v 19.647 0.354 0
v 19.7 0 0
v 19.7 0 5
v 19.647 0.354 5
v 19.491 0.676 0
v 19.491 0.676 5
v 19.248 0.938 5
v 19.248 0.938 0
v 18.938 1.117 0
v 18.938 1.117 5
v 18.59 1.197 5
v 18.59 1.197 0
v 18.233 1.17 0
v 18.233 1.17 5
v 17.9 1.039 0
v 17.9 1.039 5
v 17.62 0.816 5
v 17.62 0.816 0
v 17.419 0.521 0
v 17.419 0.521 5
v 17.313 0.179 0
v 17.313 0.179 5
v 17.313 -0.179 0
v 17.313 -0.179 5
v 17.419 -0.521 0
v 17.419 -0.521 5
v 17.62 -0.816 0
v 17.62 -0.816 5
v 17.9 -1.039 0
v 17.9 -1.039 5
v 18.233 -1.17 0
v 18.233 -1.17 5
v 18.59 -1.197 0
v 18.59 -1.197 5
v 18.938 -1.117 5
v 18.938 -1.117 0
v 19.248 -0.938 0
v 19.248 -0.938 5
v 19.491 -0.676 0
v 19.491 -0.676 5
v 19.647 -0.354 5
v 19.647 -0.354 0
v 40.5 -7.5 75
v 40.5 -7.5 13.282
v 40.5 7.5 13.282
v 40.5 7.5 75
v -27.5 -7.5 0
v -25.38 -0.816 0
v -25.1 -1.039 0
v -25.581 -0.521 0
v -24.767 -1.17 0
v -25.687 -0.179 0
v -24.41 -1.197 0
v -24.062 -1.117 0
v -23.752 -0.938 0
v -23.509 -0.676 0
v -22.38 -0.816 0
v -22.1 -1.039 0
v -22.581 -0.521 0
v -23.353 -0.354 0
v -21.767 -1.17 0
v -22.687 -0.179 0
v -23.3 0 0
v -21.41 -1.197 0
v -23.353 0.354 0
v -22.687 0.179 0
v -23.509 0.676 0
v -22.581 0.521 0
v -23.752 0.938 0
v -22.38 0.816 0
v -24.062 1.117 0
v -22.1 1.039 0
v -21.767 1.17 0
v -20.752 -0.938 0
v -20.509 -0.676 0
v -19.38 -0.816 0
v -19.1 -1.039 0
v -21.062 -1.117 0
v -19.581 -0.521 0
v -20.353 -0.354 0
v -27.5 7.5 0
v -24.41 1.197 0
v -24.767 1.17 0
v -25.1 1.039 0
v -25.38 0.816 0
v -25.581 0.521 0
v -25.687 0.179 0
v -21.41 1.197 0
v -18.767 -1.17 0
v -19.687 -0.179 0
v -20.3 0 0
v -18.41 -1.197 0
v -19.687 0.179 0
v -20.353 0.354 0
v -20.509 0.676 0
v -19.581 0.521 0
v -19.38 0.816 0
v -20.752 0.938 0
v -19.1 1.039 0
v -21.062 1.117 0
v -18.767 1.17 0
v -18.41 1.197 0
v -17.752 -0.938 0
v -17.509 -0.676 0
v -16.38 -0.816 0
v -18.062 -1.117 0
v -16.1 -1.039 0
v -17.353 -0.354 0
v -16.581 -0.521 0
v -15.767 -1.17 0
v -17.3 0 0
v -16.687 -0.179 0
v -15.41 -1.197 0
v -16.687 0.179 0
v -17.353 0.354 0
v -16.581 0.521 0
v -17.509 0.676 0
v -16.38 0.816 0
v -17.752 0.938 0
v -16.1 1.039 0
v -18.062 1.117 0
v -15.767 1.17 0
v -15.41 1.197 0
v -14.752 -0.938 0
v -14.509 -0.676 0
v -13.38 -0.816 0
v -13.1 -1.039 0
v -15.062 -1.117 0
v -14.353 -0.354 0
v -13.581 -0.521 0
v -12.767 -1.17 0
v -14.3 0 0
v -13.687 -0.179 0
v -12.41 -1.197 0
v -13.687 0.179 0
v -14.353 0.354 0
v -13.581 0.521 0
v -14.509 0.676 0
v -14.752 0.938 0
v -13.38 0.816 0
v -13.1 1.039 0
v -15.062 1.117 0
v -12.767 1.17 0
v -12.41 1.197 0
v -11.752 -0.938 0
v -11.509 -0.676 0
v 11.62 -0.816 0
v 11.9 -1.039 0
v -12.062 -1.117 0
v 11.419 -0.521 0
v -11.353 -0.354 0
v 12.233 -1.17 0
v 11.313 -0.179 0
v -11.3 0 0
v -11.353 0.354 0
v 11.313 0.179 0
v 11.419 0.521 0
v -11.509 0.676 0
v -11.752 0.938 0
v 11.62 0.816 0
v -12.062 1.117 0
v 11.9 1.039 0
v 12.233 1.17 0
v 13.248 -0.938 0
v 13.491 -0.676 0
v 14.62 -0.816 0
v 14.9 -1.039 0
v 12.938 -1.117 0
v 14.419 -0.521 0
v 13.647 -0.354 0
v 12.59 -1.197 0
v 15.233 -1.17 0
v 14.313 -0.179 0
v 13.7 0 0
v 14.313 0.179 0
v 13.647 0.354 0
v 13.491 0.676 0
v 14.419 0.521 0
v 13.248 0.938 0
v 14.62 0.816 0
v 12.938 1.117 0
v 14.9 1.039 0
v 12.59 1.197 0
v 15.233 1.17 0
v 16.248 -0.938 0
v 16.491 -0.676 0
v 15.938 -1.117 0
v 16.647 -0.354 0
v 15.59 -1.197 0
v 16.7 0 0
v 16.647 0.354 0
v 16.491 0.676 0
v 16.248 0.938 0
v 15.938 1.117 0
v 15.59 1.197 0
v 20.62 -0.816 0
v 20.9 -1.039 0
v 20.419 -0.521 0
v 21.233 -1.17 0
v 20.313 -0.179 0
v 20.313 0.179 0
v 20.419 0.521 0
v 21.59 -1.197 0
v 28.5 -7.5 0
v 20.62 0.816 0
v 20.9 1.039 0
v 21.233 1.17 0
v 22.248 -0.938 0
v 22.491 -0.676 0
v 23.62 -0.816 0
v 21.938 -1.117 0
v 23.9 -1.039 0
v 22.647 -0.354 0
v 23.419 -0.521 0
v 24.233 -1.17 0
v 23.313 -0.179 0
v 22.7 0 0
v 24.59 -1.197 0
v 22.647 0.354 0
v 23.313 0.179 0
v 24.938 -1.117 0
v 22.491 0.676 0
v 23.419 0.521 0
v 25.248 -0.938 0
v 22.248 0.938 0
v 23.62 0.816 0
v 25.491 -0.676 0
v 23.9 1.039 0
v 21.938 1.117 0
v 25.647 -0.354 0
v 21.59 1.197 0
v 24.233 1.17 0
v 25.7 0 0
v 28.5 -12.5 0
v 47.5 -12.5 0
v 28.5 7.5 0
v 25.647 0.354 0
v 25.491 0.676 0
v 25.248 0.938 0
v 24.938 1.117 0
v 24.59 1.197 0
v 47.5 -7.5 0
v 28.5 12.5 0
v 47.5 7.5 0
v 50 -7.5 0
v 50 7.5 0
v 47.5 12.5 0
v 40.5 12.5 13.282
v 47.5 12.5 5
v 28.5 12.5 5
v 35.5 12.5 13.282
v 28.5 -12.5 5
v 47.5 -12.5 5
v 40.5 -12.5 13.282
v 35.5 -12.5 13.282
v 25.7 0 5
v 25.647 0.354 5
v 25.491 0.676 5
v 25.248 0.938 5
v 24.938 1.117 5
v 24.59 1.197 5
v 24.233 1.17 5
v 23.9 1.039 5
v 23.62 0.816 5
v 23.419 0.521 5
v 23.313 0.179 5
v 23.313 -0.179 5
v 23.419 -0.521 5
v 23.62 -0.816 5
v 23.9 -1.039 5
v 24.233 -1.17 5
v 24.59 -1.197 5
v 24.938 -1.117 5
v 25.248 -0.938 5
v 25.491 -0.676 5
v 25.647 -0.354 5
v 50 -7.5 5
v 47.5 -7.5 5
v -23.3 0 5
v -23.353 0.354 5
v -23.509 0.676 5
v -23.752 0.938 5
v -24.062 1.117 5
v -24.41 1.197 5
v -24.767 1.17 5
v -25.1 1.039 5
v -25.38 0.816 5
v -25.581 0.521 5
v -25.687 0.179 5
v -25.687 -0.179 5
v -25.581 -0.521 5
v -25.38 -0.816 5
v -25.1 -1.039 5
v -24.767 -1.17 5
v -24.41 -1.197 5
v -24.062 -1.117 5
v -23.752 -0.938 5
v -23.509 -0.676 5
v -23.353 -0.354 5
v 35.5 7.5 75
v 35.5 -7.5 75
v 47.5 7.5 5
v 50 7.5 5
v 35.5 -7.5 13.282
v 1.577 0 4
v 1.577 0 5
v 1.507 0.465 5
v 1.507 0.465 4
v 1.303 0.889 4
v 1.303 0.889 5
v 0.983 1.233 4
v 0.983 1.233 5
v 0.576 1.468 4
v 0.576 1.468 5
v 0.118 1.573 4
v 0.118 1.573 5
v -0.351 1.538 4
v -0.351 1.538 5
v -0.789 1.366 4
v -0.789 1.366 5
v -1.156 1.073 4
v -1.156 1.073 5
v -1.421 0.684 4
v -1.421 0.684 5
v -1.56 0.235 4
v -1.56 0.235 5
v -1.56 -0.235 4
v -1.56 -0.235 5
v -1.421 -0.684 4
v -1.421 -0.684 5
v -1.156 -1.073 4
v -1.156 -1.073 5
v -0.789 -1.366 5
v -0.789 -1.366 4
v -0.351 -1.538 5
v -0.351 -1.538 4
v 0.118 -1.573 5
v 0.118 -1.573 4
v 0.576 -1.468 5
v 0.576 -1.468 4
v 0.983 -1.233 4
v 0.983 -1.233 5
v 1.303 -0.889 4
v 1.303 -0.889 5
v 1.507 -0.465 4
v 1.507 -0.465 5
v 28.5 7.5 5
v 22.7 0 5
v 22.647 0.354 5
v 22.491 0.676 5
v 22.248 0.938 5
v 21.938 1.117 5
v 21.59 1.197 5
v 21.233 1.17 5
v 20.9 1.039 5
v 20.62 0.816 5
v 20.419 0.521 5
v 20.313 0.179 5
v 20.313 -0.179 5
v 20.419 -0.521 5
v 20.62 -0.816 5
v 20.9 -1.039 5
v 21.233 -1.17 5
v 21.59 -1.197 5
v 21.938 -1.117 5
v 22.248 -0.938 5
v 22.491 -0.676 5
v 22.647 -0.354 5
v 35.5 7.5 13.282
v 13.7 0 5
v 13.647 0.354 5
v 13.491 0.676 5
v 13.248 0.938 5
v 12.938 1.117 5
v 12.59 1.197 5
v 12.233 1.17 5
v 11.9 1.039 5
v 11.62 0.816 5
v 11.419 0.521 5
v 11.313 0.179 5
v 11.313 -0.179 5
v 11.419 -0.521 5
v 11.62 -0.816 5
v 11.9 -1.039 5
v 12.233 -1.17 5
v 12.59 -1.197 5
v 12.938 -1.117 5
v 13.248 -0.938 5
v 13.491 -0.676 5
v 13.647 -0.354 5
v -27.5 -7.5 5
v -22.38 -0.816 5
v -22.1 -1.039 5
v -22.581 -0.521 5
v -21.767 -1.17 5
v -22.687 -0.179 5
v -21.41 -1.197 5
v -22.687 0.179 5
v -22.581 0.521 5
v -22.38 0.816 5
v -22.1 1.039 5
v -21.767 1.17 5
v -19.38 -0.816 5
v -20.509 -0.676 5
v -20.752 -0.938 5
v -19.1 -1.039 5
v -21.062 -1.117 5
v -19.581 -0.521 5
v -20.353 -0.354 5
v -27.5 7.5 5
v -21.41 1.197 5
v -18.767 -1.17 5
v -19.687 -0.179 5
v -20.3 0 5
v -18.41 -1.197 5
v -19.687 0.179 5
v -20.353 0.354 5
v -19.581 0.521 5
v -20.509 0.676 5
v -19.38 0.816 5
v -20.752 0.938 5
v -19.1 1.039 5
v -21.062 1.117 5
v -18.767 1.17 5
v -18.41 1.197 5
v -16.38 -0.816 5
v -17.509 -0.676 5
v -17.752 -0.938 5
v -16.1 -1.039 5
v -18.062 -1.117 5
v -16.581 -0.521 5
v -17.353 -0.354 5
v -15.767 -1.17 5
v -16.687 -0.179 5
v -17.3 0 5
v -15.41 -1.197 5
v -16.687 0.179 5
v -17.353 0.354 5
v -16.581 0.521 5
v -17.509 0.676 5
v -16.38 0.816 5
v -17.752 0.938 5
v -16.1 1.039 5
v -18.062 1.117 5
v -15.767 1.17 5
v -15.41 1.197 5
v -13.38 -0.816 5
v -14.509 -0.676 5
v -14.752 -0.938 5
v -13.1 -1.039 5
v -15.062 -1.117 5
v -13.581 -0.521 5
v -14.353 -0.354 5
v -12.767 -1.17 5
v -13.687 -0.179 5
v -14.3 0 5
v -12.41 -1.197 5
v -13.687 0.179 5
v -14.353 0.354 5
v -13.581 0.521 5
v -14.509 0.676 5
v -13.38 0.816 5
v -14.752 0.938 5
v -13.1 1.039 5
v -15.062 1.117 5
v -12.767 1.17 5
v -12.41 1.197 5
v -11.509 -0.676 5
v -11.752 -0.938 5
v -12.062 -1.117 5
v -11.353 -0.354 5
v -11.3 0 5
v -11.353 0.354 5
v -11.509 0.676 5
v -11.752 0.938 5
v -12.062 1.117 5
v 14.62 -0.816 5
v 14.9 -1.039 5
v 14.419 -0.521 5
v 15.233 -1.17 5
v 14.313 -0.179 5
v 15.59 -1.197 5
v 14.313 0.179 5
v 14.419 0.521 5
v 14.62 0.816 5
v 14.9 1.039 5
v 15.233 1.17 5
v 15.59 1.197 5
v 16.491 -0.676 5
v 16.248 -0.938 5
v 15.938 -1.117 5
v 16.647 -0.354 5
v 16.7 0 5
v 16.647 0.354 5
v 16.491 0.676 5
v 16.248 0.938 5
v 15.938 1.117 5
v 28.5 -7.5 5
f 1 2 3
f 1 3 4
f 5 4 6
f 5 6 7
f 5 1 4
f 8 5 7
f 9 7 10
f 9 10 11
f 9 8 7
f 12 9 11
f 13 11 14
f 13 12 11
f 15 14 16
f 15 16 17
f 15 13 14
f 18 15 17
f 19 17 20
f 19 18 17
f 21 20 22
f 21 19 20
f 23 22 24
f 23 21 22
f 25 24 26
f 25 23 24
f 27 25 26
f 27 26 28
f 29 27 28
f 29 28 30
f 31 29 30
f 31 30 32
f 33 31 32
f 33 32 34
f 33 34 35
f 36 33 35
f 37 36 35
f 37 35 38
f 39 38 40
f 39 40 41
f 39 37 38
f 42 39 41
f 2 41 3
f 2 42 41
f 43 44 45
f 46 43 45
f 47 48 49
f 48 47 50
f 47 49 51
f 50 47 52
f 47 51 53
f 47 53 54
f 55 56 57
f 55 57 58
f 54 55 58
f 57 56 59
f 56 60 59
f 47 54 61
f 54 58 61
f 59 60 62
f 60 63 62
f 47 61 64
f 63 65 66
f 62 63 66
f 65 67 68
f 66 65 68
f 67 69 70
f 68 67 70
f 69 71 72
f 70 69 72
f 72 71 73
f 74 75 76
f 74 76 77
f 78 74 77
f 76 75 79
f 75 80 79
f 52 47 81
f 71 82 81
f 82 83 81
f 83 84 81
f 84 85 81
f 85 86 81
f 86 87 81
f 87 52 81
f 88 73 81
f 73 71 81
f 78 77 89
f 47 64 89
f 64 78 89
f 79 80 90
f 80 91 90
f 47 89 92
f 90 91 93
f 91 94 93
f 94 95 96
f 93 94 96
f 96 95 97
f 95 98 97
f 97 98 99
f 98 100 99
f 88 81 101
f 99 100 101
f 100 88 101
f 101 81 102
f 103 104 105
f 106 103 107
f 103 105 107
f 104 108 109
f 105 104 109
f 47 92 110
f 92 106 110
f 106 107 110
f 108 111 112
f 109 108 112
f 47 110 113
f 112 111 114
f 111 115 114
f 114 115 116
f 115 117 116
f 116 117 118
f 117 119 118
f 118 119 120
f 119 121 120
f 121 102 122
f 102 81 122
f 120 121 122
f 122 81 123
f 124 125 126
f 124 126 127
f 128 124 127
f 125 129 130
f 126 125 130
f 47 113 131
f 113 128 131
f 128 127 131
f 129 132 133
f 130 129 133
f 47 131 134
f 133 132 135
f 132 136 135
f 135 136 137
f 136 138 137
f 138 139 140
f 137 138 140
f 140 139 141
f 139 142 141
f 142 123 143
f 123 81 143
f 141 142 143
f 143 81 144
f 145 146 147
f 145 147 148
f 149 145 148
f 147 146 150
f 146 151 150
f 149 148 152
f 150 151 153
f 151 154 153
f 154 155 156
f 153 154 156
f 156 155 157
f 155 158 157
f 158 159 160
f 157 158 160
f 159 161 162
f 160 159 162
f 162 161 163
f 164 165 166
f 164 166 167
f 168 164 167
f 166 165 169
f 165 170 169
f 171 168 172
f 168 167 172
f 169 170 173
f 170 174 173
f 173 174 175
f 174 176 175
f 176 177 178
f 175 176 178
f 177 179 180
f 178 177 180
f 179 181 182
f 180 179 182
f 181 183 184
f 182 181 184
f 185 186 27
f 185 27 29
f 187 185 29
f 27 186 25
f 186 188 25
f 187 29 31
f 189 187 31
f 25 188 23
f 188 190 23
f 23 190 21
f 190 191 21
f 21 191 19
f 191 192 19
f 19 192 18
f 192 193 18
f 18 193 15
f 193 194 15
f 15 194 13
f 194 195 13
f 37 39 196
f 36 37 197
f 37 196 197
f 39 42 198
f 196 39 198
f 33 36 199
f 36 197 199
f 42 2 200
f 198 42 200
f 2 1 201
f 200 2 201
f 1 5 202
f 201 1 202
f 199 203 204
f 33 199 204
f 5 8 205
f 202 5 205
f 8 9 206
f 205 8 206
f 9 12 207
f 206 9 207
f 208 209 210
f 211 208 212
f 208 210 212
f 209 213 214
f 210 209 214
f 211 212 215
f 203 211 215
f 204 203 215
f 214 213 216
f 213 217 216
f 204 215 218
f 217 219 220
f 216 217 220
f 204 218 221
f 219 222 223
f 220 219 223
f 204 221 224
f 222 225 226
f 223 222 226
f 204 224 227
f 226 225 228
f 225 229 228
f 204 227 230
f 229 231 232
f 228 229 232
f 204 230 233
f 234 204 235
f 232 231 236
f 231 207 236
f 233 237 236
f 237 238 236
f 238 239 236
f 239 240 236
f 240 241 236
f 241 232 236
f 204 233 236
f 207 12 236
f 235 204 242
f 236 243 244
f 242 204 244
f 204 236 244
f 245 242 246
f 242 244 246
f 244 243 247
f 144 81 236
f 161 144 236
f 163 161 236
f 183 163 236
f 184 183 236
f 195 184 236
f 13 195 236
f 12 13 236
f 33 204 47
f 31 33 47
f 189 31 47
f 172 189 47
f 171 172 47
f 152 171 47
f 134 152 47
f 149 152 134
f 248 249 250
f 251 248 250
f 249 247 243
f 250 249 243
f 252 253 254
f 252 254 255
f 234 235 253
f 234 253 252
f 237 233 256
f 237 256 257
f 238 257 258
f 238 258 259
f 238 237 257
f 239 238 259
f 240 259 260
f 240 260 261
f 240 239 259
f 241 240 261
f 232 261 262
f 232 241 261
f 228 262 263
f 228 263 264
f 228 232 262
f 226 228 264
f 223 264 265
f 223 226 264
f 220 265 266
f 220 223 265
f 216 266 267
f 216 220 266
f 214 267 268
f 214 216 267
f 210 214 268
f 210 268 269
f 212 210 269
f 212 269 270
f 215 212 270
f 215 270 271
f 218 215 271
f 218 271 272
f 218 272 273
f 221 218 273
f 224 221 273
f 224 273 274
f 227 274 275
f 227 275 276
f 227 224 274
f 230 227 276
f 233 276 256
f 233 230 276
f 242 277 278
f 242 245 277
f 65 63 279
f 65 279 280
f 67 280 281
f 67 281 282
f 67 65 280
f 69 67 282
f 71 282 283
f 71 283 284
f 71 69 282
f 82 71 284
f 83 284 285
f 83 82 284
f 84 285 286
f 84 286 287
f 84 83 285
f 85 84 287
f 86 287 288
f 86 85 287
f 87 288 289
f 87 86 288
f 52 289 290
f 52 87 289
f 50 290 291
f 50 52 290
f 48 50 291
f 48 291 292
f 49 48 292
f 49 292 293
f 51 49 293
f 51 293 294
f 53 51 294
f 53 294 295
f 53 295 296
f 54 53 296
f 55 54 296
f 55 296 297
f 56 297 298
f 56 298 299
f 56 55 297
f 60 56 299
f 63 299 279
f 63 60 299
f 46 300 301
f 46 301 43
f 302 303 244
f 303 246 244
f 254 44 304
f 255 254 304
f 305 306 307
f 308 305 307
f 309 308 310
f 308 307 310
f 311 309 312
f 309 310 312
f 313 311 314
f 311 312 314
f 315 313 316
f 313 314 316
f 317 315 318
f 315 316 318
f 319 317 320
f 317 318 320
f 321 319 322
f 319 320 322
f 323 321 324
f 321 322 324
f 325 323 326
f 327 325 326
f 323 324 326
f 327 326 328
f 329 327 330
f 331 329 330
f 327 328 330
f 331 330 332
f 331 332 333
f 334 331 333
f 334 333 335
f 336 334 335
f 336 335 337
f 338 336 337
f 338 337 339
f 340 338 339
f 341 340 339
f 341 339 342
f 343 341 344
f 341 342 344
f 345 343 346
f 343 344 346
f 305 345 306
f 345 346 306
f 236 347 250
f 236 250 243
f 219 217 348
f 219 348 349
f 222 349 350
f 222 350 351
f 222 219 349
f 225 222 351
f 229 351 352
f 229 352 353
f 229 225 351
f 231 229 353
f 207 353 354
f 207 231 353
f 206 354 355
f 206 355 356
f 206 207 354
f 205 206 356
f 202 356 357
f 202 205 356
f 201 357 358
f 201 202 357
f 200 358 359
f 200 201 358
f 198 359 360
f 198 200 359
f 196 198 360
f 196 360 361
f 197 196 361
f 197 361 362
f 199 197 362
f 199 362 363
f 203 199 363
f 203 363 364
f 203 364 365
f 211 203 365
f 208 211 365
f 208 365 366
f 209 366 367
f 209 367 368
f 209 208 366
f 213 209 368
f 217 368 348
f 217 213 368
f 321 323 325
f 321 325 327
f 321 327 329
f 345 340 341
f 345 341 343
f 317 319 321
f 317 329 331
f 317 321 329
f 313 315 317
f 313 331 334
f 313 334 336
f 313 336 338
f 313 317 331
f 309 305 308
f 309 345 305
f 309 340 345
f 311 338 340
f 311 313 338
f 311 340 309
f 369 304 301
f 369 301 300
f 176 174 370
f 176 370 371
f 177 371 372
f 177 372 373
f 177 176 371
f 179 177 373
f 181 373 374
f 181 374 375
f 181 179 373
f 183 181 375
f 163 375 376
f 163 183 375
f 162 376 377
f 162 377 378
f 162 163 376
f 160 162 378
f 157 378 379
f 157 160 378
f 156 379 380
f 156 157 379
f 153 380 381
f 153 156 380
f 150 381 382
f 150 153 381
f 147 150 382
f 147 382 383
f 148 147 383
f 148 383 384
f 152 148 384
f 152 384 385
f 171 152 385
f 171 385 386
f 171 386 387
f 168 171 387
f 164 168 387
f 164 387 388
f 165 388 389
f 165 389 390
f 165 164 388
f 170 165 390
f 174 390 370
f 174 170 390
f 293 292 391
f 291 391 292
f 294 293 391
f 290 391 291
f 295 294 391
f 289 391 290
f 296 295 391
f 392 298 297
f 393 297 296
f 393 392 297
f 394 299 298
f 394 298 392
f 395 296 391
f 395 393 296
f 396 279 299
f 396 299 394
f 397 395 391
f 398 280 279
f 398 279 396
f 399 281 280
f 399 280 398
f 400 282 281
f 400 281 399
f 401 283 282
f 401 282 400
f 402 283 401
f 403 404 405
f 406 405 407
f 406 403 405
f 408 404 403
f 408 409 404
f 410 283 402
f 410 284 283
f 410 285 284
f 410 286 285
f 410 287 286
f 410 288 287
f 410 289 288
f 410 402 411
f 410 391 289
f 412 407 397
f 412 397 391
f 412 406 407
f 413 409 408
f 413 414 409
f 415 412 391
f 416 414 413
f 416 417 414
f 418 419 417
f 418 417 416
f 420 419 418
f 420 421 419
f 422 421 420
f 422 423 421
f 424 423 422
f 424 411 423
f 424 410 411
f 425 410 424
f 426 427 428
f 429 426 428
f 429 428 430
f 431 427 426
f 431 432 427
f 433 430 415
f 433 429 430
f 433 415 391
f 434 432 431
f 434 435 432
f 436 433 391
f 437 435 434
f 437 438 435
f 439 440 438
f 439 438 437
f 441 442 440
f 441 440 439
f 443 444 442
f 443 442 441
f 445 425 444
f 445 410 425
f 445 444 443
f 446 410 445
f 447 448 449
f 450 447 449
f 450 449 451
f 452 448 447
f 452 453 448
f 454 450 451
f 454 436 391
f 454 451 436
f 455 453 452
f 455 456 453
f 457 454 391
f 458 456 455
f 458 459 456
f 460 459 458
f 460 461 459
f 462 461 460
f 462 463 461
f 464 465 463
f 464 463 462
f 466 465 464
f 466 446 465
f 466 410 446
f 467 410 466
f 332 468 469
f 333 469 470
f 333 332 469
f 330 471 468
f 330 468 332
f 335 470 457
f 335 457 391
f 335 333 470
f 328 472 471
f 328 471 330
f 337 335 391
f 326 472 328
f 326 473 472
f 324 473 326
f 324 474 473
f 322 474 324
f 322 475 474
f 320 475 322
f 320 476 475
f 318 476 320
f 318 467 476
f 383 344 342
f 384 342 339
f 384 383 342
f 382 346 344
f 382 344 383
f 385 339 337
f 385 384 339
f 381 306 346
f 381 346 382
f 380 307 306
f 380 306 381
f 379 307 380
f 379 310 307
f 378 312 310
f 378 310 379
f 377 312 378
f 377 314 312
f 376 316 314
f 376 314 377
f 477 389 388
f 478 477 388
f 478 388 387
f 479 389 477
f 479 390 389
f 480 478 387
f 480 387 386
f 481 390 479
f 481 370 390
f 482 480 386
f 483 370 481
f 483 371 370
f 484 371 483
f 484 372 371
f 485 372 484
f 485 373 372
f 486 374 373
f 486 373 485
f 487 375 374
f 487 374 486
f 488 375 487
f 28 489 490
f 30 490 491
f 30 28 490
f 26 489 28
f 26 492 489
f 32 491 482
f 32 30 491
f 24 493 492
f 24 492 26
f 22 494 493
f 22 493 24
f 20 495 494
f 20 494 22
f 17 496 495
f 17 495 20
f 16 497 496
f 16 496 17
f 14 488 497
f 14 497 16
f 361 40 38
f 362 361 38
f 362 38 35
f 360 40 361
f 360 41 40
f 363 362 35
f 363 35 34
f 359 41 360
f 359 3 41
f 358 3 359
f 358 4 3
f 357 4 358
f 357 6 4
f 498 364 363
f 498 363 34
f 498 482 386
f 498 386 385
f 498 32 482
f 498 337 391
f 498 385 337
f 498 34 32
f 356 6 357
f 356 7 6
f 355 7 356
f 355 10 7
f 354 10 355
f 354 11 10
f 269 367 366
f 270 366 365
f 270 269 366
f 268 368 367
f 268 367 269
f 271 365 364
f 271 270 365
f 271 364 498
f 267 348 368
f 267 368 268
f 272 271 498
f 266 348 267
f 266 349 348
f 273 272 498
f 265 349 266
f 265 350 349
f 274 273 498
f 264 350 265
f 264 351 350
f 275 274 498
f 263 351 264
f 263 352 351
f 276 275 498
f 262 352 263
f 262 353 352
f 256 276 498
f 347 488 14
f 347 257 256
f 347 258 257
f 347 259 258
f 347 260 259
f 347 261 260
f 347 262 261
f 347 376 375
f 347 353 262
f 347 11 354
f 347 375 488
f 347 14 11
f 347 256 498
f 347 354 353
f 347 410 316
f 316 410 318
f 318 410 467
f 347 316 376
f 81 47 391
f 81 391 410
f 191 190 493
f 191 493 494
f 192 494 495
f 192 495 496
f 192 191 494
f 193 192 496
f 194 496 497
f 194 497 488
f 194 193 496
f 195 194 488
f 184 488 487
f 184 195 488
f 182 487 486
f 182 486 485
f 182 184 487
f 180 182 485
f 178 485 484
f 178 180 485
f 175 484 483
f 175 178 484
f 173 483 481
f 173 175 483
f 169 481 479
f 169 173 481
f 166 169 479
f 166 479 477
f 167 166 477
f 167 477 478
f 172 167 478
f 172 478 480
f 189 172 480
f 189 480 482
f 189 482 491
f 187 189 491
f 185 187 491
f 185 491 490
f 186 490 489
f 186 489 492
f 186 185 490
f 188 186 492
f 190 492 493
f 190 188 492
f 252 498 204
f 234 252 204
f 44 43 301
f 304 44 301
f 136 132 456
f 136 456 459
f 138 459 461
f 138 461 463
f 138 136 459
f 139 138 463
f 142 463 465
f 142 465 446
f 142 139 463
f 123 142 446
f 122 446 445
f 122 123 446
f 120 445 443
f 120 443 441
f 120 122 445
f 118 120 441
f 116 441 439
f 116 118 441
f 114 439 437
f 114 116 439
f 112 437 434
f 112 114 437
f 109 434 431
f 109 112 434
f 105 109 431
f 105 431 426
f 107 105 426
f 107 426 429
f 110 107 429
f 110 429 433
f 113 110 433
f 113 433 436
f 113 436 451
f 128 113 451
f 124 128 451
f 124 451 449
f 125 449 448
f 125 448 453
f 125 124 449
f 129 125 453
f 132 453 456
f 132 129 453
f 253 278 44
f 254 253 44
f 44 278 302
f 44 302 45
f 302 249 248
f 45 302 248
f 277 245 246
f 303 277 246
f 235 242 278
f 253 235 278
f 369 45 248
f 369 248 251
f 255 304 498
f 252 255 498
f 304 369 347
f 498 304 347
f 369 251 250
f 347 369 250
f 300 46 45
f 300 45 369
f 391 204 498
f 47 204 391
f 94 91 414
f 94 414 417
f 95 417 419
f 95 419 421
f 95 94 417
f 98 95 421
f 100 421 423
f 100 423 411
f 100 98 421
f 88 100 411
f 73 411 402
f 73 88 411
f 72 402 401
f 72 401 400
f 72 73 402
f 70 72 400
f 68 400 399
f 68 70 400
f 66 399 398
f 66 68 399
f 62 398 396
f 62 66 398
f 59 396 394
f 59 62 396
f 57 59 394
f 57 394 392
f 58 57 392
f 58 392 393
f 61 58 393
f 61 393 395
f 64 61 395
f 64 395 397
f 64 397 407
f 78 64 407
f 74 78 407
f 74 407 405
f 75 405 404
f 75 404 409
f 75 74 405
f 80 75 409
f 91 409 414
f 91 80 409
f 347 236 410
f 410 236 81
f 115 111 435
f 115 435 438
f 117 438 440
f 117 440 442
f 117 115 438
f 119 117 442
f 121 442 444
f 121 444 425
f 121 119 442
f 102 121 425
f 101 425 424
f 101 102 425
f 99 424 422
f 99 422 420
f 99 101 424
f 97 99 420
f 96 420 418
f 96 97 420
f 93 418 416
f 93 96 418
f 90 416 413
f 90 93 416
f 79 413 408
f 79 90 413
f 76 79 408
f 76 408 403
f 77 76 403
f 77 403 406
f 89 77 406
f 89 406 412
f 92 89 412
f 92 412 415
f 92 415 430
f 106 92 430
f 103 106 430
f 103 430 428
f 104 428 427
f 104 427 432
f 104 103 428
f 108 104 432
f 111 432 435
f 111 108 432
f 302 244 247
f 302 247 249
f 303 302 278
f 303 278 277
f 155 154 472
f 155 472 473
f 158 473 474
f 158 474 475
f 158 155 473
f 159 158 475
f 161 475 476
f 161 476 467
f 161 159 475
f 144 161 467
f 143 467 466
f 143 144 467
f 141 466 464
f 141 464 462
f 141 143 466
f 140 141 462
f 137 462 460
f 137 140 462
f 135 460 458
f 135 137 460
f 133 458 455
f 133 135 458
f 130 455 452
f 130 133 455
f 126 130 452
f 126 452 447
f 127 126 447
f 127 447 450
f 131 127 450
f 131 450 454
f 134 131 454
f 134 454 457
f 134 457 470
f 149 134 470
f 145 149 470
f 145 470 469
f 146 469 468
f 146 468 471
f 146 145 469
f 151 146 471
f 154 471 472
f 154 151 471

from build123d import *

# Parameters (mm, degrees)
SKETCH1_W           = 55
SKETCH1_H           = 15
SKETCH1_R           = 1.2
SKETCH1_W_2         = 22.5
BOSS_EXTRUDE1_DEPTH = 5
SKETCH2_R           = 1.577401702
CUT_EXTRUDE1_DEPTH  = 1
SKETCH2_3_W         = 5
SKETCH2_3_H         = 15
BOSS_EXTRUDE2_DEPTH = 70
BOSS_EXTRUDE3_DEPTH = 15
BOSS_EXTRUDE4_DEPTH = 5


with BuildPart() as part:
    # Sketch1 → Boss-Extrude1 (new body)
    with BuildSketch(Plane.XY):
        Rectangle(SKETCH1_W, SKETCH1_H)
        with Locations((-15.5, 0)):
            Circle(SKETCH1_R, mode=Mode.SUBTRACT)
        with Locations((-21.5, 0)):
            Circle(SKETCH1_R, mode=Mode.SUBTRACT)
        with Locations((24.5, 0)):
            Circle(SKETCH1_R, mode=Mode.SUBTRACT)
        with Locations((21.5, 0)):
            Circle(SKETCH1_R, mode=Mode.SUBTRACT)
        with Locations((18.5, 0)):
            Circle(SKETCH1_R, mode=Mode.SUBTRACT)
        with Locations((15.5, 0)):
            Circle(SKETCH1_R, mode=Mode.SUBTRACT)
        with Locations((12.5, 0)):
            Circle(SKETCH1_R, mode=Mode.SUBTRACT)
        with Locations((-24.5, 0)):
            Circle(SKETCH1_R, mode=Mode.SUBTRACT)
        with Locations((-18.5, 0)):
            Circle(SKETCH1_R, mode=Mode.SUBTRACT)
        with Locations((-12.5, 0)):
            Circle(SKETCH1_R, mode=Mode.SUBTRACT)
        with Locations((38.75, 0)):
            Rectangle(SKETCH1_W_2, SKETCH1_H)
    extrude(amount=BOSS_EXTRUDE1_DEPTH)

    # Sketch2 → Cut-Extrude1 (cut)
    with BuildSketch(Plane.XY.offset(5)):
        Circle(SKETCH2_R)
    extrude(amount=-CUT_EXTRUDE1_DEPTH, mode=Mode.SUBTRACT)

    # Sketch2<3> → Boss-Extrude2 (add)
    with BuildSketch(Plane.XY.offset(5)):
        with Locations((38, 0)):
            Rectangle(SKETCH2_3_W, SKETCH2_3_H)
    extrude(amount=BOSS_EXTRUDE2_DEPTH)

    # Sketch6 → Boss-Extrude3 (add)
    with BuildSketch(Plane(origin=(0, 7.5, 0), x_dir=(1, 0, 0), z_dir=(0, 1, 0))):
        Polygon((28.5, -5), (35.5, -13.282174024), (35.5, -5), align=None)
    boss_extrude3 = extrude(amount=-BOSS_EXTRUDE3_DEPTH)

    # Mirror1: Boss-Extrude3 across plane
    add(boss_extrude3.mirror(Plane(origin=(38, 0, 0), x_dir=(0, 0, 1), z_dir=(1, 0, 0))))

    # Sketch7 → Boss-Extrude4 (add)
    with BuildSketch(Plane(origin=(0, 7.5, 0), x_dir=(1, 0, 0), z_dir=(0, 1, 0))):
        Polygon((35.5, -13.282174024), (28.5, -5), (28.5, 0), (47.5, 0), (47.5, -5), (40.5, -13.282174024), align=None)
    boss_extrude4 = extrude(amount=BOSS_EXTRUDE4_DEPTH)

    # Mirror2: Boss-Extrude4 across plane
    add(boss_extrude4.mirror(Plane(origin=(0, 0, 0), x_dir=(0, 0, 1), z_dir=(0, -1, 0))))


solid = part.part
